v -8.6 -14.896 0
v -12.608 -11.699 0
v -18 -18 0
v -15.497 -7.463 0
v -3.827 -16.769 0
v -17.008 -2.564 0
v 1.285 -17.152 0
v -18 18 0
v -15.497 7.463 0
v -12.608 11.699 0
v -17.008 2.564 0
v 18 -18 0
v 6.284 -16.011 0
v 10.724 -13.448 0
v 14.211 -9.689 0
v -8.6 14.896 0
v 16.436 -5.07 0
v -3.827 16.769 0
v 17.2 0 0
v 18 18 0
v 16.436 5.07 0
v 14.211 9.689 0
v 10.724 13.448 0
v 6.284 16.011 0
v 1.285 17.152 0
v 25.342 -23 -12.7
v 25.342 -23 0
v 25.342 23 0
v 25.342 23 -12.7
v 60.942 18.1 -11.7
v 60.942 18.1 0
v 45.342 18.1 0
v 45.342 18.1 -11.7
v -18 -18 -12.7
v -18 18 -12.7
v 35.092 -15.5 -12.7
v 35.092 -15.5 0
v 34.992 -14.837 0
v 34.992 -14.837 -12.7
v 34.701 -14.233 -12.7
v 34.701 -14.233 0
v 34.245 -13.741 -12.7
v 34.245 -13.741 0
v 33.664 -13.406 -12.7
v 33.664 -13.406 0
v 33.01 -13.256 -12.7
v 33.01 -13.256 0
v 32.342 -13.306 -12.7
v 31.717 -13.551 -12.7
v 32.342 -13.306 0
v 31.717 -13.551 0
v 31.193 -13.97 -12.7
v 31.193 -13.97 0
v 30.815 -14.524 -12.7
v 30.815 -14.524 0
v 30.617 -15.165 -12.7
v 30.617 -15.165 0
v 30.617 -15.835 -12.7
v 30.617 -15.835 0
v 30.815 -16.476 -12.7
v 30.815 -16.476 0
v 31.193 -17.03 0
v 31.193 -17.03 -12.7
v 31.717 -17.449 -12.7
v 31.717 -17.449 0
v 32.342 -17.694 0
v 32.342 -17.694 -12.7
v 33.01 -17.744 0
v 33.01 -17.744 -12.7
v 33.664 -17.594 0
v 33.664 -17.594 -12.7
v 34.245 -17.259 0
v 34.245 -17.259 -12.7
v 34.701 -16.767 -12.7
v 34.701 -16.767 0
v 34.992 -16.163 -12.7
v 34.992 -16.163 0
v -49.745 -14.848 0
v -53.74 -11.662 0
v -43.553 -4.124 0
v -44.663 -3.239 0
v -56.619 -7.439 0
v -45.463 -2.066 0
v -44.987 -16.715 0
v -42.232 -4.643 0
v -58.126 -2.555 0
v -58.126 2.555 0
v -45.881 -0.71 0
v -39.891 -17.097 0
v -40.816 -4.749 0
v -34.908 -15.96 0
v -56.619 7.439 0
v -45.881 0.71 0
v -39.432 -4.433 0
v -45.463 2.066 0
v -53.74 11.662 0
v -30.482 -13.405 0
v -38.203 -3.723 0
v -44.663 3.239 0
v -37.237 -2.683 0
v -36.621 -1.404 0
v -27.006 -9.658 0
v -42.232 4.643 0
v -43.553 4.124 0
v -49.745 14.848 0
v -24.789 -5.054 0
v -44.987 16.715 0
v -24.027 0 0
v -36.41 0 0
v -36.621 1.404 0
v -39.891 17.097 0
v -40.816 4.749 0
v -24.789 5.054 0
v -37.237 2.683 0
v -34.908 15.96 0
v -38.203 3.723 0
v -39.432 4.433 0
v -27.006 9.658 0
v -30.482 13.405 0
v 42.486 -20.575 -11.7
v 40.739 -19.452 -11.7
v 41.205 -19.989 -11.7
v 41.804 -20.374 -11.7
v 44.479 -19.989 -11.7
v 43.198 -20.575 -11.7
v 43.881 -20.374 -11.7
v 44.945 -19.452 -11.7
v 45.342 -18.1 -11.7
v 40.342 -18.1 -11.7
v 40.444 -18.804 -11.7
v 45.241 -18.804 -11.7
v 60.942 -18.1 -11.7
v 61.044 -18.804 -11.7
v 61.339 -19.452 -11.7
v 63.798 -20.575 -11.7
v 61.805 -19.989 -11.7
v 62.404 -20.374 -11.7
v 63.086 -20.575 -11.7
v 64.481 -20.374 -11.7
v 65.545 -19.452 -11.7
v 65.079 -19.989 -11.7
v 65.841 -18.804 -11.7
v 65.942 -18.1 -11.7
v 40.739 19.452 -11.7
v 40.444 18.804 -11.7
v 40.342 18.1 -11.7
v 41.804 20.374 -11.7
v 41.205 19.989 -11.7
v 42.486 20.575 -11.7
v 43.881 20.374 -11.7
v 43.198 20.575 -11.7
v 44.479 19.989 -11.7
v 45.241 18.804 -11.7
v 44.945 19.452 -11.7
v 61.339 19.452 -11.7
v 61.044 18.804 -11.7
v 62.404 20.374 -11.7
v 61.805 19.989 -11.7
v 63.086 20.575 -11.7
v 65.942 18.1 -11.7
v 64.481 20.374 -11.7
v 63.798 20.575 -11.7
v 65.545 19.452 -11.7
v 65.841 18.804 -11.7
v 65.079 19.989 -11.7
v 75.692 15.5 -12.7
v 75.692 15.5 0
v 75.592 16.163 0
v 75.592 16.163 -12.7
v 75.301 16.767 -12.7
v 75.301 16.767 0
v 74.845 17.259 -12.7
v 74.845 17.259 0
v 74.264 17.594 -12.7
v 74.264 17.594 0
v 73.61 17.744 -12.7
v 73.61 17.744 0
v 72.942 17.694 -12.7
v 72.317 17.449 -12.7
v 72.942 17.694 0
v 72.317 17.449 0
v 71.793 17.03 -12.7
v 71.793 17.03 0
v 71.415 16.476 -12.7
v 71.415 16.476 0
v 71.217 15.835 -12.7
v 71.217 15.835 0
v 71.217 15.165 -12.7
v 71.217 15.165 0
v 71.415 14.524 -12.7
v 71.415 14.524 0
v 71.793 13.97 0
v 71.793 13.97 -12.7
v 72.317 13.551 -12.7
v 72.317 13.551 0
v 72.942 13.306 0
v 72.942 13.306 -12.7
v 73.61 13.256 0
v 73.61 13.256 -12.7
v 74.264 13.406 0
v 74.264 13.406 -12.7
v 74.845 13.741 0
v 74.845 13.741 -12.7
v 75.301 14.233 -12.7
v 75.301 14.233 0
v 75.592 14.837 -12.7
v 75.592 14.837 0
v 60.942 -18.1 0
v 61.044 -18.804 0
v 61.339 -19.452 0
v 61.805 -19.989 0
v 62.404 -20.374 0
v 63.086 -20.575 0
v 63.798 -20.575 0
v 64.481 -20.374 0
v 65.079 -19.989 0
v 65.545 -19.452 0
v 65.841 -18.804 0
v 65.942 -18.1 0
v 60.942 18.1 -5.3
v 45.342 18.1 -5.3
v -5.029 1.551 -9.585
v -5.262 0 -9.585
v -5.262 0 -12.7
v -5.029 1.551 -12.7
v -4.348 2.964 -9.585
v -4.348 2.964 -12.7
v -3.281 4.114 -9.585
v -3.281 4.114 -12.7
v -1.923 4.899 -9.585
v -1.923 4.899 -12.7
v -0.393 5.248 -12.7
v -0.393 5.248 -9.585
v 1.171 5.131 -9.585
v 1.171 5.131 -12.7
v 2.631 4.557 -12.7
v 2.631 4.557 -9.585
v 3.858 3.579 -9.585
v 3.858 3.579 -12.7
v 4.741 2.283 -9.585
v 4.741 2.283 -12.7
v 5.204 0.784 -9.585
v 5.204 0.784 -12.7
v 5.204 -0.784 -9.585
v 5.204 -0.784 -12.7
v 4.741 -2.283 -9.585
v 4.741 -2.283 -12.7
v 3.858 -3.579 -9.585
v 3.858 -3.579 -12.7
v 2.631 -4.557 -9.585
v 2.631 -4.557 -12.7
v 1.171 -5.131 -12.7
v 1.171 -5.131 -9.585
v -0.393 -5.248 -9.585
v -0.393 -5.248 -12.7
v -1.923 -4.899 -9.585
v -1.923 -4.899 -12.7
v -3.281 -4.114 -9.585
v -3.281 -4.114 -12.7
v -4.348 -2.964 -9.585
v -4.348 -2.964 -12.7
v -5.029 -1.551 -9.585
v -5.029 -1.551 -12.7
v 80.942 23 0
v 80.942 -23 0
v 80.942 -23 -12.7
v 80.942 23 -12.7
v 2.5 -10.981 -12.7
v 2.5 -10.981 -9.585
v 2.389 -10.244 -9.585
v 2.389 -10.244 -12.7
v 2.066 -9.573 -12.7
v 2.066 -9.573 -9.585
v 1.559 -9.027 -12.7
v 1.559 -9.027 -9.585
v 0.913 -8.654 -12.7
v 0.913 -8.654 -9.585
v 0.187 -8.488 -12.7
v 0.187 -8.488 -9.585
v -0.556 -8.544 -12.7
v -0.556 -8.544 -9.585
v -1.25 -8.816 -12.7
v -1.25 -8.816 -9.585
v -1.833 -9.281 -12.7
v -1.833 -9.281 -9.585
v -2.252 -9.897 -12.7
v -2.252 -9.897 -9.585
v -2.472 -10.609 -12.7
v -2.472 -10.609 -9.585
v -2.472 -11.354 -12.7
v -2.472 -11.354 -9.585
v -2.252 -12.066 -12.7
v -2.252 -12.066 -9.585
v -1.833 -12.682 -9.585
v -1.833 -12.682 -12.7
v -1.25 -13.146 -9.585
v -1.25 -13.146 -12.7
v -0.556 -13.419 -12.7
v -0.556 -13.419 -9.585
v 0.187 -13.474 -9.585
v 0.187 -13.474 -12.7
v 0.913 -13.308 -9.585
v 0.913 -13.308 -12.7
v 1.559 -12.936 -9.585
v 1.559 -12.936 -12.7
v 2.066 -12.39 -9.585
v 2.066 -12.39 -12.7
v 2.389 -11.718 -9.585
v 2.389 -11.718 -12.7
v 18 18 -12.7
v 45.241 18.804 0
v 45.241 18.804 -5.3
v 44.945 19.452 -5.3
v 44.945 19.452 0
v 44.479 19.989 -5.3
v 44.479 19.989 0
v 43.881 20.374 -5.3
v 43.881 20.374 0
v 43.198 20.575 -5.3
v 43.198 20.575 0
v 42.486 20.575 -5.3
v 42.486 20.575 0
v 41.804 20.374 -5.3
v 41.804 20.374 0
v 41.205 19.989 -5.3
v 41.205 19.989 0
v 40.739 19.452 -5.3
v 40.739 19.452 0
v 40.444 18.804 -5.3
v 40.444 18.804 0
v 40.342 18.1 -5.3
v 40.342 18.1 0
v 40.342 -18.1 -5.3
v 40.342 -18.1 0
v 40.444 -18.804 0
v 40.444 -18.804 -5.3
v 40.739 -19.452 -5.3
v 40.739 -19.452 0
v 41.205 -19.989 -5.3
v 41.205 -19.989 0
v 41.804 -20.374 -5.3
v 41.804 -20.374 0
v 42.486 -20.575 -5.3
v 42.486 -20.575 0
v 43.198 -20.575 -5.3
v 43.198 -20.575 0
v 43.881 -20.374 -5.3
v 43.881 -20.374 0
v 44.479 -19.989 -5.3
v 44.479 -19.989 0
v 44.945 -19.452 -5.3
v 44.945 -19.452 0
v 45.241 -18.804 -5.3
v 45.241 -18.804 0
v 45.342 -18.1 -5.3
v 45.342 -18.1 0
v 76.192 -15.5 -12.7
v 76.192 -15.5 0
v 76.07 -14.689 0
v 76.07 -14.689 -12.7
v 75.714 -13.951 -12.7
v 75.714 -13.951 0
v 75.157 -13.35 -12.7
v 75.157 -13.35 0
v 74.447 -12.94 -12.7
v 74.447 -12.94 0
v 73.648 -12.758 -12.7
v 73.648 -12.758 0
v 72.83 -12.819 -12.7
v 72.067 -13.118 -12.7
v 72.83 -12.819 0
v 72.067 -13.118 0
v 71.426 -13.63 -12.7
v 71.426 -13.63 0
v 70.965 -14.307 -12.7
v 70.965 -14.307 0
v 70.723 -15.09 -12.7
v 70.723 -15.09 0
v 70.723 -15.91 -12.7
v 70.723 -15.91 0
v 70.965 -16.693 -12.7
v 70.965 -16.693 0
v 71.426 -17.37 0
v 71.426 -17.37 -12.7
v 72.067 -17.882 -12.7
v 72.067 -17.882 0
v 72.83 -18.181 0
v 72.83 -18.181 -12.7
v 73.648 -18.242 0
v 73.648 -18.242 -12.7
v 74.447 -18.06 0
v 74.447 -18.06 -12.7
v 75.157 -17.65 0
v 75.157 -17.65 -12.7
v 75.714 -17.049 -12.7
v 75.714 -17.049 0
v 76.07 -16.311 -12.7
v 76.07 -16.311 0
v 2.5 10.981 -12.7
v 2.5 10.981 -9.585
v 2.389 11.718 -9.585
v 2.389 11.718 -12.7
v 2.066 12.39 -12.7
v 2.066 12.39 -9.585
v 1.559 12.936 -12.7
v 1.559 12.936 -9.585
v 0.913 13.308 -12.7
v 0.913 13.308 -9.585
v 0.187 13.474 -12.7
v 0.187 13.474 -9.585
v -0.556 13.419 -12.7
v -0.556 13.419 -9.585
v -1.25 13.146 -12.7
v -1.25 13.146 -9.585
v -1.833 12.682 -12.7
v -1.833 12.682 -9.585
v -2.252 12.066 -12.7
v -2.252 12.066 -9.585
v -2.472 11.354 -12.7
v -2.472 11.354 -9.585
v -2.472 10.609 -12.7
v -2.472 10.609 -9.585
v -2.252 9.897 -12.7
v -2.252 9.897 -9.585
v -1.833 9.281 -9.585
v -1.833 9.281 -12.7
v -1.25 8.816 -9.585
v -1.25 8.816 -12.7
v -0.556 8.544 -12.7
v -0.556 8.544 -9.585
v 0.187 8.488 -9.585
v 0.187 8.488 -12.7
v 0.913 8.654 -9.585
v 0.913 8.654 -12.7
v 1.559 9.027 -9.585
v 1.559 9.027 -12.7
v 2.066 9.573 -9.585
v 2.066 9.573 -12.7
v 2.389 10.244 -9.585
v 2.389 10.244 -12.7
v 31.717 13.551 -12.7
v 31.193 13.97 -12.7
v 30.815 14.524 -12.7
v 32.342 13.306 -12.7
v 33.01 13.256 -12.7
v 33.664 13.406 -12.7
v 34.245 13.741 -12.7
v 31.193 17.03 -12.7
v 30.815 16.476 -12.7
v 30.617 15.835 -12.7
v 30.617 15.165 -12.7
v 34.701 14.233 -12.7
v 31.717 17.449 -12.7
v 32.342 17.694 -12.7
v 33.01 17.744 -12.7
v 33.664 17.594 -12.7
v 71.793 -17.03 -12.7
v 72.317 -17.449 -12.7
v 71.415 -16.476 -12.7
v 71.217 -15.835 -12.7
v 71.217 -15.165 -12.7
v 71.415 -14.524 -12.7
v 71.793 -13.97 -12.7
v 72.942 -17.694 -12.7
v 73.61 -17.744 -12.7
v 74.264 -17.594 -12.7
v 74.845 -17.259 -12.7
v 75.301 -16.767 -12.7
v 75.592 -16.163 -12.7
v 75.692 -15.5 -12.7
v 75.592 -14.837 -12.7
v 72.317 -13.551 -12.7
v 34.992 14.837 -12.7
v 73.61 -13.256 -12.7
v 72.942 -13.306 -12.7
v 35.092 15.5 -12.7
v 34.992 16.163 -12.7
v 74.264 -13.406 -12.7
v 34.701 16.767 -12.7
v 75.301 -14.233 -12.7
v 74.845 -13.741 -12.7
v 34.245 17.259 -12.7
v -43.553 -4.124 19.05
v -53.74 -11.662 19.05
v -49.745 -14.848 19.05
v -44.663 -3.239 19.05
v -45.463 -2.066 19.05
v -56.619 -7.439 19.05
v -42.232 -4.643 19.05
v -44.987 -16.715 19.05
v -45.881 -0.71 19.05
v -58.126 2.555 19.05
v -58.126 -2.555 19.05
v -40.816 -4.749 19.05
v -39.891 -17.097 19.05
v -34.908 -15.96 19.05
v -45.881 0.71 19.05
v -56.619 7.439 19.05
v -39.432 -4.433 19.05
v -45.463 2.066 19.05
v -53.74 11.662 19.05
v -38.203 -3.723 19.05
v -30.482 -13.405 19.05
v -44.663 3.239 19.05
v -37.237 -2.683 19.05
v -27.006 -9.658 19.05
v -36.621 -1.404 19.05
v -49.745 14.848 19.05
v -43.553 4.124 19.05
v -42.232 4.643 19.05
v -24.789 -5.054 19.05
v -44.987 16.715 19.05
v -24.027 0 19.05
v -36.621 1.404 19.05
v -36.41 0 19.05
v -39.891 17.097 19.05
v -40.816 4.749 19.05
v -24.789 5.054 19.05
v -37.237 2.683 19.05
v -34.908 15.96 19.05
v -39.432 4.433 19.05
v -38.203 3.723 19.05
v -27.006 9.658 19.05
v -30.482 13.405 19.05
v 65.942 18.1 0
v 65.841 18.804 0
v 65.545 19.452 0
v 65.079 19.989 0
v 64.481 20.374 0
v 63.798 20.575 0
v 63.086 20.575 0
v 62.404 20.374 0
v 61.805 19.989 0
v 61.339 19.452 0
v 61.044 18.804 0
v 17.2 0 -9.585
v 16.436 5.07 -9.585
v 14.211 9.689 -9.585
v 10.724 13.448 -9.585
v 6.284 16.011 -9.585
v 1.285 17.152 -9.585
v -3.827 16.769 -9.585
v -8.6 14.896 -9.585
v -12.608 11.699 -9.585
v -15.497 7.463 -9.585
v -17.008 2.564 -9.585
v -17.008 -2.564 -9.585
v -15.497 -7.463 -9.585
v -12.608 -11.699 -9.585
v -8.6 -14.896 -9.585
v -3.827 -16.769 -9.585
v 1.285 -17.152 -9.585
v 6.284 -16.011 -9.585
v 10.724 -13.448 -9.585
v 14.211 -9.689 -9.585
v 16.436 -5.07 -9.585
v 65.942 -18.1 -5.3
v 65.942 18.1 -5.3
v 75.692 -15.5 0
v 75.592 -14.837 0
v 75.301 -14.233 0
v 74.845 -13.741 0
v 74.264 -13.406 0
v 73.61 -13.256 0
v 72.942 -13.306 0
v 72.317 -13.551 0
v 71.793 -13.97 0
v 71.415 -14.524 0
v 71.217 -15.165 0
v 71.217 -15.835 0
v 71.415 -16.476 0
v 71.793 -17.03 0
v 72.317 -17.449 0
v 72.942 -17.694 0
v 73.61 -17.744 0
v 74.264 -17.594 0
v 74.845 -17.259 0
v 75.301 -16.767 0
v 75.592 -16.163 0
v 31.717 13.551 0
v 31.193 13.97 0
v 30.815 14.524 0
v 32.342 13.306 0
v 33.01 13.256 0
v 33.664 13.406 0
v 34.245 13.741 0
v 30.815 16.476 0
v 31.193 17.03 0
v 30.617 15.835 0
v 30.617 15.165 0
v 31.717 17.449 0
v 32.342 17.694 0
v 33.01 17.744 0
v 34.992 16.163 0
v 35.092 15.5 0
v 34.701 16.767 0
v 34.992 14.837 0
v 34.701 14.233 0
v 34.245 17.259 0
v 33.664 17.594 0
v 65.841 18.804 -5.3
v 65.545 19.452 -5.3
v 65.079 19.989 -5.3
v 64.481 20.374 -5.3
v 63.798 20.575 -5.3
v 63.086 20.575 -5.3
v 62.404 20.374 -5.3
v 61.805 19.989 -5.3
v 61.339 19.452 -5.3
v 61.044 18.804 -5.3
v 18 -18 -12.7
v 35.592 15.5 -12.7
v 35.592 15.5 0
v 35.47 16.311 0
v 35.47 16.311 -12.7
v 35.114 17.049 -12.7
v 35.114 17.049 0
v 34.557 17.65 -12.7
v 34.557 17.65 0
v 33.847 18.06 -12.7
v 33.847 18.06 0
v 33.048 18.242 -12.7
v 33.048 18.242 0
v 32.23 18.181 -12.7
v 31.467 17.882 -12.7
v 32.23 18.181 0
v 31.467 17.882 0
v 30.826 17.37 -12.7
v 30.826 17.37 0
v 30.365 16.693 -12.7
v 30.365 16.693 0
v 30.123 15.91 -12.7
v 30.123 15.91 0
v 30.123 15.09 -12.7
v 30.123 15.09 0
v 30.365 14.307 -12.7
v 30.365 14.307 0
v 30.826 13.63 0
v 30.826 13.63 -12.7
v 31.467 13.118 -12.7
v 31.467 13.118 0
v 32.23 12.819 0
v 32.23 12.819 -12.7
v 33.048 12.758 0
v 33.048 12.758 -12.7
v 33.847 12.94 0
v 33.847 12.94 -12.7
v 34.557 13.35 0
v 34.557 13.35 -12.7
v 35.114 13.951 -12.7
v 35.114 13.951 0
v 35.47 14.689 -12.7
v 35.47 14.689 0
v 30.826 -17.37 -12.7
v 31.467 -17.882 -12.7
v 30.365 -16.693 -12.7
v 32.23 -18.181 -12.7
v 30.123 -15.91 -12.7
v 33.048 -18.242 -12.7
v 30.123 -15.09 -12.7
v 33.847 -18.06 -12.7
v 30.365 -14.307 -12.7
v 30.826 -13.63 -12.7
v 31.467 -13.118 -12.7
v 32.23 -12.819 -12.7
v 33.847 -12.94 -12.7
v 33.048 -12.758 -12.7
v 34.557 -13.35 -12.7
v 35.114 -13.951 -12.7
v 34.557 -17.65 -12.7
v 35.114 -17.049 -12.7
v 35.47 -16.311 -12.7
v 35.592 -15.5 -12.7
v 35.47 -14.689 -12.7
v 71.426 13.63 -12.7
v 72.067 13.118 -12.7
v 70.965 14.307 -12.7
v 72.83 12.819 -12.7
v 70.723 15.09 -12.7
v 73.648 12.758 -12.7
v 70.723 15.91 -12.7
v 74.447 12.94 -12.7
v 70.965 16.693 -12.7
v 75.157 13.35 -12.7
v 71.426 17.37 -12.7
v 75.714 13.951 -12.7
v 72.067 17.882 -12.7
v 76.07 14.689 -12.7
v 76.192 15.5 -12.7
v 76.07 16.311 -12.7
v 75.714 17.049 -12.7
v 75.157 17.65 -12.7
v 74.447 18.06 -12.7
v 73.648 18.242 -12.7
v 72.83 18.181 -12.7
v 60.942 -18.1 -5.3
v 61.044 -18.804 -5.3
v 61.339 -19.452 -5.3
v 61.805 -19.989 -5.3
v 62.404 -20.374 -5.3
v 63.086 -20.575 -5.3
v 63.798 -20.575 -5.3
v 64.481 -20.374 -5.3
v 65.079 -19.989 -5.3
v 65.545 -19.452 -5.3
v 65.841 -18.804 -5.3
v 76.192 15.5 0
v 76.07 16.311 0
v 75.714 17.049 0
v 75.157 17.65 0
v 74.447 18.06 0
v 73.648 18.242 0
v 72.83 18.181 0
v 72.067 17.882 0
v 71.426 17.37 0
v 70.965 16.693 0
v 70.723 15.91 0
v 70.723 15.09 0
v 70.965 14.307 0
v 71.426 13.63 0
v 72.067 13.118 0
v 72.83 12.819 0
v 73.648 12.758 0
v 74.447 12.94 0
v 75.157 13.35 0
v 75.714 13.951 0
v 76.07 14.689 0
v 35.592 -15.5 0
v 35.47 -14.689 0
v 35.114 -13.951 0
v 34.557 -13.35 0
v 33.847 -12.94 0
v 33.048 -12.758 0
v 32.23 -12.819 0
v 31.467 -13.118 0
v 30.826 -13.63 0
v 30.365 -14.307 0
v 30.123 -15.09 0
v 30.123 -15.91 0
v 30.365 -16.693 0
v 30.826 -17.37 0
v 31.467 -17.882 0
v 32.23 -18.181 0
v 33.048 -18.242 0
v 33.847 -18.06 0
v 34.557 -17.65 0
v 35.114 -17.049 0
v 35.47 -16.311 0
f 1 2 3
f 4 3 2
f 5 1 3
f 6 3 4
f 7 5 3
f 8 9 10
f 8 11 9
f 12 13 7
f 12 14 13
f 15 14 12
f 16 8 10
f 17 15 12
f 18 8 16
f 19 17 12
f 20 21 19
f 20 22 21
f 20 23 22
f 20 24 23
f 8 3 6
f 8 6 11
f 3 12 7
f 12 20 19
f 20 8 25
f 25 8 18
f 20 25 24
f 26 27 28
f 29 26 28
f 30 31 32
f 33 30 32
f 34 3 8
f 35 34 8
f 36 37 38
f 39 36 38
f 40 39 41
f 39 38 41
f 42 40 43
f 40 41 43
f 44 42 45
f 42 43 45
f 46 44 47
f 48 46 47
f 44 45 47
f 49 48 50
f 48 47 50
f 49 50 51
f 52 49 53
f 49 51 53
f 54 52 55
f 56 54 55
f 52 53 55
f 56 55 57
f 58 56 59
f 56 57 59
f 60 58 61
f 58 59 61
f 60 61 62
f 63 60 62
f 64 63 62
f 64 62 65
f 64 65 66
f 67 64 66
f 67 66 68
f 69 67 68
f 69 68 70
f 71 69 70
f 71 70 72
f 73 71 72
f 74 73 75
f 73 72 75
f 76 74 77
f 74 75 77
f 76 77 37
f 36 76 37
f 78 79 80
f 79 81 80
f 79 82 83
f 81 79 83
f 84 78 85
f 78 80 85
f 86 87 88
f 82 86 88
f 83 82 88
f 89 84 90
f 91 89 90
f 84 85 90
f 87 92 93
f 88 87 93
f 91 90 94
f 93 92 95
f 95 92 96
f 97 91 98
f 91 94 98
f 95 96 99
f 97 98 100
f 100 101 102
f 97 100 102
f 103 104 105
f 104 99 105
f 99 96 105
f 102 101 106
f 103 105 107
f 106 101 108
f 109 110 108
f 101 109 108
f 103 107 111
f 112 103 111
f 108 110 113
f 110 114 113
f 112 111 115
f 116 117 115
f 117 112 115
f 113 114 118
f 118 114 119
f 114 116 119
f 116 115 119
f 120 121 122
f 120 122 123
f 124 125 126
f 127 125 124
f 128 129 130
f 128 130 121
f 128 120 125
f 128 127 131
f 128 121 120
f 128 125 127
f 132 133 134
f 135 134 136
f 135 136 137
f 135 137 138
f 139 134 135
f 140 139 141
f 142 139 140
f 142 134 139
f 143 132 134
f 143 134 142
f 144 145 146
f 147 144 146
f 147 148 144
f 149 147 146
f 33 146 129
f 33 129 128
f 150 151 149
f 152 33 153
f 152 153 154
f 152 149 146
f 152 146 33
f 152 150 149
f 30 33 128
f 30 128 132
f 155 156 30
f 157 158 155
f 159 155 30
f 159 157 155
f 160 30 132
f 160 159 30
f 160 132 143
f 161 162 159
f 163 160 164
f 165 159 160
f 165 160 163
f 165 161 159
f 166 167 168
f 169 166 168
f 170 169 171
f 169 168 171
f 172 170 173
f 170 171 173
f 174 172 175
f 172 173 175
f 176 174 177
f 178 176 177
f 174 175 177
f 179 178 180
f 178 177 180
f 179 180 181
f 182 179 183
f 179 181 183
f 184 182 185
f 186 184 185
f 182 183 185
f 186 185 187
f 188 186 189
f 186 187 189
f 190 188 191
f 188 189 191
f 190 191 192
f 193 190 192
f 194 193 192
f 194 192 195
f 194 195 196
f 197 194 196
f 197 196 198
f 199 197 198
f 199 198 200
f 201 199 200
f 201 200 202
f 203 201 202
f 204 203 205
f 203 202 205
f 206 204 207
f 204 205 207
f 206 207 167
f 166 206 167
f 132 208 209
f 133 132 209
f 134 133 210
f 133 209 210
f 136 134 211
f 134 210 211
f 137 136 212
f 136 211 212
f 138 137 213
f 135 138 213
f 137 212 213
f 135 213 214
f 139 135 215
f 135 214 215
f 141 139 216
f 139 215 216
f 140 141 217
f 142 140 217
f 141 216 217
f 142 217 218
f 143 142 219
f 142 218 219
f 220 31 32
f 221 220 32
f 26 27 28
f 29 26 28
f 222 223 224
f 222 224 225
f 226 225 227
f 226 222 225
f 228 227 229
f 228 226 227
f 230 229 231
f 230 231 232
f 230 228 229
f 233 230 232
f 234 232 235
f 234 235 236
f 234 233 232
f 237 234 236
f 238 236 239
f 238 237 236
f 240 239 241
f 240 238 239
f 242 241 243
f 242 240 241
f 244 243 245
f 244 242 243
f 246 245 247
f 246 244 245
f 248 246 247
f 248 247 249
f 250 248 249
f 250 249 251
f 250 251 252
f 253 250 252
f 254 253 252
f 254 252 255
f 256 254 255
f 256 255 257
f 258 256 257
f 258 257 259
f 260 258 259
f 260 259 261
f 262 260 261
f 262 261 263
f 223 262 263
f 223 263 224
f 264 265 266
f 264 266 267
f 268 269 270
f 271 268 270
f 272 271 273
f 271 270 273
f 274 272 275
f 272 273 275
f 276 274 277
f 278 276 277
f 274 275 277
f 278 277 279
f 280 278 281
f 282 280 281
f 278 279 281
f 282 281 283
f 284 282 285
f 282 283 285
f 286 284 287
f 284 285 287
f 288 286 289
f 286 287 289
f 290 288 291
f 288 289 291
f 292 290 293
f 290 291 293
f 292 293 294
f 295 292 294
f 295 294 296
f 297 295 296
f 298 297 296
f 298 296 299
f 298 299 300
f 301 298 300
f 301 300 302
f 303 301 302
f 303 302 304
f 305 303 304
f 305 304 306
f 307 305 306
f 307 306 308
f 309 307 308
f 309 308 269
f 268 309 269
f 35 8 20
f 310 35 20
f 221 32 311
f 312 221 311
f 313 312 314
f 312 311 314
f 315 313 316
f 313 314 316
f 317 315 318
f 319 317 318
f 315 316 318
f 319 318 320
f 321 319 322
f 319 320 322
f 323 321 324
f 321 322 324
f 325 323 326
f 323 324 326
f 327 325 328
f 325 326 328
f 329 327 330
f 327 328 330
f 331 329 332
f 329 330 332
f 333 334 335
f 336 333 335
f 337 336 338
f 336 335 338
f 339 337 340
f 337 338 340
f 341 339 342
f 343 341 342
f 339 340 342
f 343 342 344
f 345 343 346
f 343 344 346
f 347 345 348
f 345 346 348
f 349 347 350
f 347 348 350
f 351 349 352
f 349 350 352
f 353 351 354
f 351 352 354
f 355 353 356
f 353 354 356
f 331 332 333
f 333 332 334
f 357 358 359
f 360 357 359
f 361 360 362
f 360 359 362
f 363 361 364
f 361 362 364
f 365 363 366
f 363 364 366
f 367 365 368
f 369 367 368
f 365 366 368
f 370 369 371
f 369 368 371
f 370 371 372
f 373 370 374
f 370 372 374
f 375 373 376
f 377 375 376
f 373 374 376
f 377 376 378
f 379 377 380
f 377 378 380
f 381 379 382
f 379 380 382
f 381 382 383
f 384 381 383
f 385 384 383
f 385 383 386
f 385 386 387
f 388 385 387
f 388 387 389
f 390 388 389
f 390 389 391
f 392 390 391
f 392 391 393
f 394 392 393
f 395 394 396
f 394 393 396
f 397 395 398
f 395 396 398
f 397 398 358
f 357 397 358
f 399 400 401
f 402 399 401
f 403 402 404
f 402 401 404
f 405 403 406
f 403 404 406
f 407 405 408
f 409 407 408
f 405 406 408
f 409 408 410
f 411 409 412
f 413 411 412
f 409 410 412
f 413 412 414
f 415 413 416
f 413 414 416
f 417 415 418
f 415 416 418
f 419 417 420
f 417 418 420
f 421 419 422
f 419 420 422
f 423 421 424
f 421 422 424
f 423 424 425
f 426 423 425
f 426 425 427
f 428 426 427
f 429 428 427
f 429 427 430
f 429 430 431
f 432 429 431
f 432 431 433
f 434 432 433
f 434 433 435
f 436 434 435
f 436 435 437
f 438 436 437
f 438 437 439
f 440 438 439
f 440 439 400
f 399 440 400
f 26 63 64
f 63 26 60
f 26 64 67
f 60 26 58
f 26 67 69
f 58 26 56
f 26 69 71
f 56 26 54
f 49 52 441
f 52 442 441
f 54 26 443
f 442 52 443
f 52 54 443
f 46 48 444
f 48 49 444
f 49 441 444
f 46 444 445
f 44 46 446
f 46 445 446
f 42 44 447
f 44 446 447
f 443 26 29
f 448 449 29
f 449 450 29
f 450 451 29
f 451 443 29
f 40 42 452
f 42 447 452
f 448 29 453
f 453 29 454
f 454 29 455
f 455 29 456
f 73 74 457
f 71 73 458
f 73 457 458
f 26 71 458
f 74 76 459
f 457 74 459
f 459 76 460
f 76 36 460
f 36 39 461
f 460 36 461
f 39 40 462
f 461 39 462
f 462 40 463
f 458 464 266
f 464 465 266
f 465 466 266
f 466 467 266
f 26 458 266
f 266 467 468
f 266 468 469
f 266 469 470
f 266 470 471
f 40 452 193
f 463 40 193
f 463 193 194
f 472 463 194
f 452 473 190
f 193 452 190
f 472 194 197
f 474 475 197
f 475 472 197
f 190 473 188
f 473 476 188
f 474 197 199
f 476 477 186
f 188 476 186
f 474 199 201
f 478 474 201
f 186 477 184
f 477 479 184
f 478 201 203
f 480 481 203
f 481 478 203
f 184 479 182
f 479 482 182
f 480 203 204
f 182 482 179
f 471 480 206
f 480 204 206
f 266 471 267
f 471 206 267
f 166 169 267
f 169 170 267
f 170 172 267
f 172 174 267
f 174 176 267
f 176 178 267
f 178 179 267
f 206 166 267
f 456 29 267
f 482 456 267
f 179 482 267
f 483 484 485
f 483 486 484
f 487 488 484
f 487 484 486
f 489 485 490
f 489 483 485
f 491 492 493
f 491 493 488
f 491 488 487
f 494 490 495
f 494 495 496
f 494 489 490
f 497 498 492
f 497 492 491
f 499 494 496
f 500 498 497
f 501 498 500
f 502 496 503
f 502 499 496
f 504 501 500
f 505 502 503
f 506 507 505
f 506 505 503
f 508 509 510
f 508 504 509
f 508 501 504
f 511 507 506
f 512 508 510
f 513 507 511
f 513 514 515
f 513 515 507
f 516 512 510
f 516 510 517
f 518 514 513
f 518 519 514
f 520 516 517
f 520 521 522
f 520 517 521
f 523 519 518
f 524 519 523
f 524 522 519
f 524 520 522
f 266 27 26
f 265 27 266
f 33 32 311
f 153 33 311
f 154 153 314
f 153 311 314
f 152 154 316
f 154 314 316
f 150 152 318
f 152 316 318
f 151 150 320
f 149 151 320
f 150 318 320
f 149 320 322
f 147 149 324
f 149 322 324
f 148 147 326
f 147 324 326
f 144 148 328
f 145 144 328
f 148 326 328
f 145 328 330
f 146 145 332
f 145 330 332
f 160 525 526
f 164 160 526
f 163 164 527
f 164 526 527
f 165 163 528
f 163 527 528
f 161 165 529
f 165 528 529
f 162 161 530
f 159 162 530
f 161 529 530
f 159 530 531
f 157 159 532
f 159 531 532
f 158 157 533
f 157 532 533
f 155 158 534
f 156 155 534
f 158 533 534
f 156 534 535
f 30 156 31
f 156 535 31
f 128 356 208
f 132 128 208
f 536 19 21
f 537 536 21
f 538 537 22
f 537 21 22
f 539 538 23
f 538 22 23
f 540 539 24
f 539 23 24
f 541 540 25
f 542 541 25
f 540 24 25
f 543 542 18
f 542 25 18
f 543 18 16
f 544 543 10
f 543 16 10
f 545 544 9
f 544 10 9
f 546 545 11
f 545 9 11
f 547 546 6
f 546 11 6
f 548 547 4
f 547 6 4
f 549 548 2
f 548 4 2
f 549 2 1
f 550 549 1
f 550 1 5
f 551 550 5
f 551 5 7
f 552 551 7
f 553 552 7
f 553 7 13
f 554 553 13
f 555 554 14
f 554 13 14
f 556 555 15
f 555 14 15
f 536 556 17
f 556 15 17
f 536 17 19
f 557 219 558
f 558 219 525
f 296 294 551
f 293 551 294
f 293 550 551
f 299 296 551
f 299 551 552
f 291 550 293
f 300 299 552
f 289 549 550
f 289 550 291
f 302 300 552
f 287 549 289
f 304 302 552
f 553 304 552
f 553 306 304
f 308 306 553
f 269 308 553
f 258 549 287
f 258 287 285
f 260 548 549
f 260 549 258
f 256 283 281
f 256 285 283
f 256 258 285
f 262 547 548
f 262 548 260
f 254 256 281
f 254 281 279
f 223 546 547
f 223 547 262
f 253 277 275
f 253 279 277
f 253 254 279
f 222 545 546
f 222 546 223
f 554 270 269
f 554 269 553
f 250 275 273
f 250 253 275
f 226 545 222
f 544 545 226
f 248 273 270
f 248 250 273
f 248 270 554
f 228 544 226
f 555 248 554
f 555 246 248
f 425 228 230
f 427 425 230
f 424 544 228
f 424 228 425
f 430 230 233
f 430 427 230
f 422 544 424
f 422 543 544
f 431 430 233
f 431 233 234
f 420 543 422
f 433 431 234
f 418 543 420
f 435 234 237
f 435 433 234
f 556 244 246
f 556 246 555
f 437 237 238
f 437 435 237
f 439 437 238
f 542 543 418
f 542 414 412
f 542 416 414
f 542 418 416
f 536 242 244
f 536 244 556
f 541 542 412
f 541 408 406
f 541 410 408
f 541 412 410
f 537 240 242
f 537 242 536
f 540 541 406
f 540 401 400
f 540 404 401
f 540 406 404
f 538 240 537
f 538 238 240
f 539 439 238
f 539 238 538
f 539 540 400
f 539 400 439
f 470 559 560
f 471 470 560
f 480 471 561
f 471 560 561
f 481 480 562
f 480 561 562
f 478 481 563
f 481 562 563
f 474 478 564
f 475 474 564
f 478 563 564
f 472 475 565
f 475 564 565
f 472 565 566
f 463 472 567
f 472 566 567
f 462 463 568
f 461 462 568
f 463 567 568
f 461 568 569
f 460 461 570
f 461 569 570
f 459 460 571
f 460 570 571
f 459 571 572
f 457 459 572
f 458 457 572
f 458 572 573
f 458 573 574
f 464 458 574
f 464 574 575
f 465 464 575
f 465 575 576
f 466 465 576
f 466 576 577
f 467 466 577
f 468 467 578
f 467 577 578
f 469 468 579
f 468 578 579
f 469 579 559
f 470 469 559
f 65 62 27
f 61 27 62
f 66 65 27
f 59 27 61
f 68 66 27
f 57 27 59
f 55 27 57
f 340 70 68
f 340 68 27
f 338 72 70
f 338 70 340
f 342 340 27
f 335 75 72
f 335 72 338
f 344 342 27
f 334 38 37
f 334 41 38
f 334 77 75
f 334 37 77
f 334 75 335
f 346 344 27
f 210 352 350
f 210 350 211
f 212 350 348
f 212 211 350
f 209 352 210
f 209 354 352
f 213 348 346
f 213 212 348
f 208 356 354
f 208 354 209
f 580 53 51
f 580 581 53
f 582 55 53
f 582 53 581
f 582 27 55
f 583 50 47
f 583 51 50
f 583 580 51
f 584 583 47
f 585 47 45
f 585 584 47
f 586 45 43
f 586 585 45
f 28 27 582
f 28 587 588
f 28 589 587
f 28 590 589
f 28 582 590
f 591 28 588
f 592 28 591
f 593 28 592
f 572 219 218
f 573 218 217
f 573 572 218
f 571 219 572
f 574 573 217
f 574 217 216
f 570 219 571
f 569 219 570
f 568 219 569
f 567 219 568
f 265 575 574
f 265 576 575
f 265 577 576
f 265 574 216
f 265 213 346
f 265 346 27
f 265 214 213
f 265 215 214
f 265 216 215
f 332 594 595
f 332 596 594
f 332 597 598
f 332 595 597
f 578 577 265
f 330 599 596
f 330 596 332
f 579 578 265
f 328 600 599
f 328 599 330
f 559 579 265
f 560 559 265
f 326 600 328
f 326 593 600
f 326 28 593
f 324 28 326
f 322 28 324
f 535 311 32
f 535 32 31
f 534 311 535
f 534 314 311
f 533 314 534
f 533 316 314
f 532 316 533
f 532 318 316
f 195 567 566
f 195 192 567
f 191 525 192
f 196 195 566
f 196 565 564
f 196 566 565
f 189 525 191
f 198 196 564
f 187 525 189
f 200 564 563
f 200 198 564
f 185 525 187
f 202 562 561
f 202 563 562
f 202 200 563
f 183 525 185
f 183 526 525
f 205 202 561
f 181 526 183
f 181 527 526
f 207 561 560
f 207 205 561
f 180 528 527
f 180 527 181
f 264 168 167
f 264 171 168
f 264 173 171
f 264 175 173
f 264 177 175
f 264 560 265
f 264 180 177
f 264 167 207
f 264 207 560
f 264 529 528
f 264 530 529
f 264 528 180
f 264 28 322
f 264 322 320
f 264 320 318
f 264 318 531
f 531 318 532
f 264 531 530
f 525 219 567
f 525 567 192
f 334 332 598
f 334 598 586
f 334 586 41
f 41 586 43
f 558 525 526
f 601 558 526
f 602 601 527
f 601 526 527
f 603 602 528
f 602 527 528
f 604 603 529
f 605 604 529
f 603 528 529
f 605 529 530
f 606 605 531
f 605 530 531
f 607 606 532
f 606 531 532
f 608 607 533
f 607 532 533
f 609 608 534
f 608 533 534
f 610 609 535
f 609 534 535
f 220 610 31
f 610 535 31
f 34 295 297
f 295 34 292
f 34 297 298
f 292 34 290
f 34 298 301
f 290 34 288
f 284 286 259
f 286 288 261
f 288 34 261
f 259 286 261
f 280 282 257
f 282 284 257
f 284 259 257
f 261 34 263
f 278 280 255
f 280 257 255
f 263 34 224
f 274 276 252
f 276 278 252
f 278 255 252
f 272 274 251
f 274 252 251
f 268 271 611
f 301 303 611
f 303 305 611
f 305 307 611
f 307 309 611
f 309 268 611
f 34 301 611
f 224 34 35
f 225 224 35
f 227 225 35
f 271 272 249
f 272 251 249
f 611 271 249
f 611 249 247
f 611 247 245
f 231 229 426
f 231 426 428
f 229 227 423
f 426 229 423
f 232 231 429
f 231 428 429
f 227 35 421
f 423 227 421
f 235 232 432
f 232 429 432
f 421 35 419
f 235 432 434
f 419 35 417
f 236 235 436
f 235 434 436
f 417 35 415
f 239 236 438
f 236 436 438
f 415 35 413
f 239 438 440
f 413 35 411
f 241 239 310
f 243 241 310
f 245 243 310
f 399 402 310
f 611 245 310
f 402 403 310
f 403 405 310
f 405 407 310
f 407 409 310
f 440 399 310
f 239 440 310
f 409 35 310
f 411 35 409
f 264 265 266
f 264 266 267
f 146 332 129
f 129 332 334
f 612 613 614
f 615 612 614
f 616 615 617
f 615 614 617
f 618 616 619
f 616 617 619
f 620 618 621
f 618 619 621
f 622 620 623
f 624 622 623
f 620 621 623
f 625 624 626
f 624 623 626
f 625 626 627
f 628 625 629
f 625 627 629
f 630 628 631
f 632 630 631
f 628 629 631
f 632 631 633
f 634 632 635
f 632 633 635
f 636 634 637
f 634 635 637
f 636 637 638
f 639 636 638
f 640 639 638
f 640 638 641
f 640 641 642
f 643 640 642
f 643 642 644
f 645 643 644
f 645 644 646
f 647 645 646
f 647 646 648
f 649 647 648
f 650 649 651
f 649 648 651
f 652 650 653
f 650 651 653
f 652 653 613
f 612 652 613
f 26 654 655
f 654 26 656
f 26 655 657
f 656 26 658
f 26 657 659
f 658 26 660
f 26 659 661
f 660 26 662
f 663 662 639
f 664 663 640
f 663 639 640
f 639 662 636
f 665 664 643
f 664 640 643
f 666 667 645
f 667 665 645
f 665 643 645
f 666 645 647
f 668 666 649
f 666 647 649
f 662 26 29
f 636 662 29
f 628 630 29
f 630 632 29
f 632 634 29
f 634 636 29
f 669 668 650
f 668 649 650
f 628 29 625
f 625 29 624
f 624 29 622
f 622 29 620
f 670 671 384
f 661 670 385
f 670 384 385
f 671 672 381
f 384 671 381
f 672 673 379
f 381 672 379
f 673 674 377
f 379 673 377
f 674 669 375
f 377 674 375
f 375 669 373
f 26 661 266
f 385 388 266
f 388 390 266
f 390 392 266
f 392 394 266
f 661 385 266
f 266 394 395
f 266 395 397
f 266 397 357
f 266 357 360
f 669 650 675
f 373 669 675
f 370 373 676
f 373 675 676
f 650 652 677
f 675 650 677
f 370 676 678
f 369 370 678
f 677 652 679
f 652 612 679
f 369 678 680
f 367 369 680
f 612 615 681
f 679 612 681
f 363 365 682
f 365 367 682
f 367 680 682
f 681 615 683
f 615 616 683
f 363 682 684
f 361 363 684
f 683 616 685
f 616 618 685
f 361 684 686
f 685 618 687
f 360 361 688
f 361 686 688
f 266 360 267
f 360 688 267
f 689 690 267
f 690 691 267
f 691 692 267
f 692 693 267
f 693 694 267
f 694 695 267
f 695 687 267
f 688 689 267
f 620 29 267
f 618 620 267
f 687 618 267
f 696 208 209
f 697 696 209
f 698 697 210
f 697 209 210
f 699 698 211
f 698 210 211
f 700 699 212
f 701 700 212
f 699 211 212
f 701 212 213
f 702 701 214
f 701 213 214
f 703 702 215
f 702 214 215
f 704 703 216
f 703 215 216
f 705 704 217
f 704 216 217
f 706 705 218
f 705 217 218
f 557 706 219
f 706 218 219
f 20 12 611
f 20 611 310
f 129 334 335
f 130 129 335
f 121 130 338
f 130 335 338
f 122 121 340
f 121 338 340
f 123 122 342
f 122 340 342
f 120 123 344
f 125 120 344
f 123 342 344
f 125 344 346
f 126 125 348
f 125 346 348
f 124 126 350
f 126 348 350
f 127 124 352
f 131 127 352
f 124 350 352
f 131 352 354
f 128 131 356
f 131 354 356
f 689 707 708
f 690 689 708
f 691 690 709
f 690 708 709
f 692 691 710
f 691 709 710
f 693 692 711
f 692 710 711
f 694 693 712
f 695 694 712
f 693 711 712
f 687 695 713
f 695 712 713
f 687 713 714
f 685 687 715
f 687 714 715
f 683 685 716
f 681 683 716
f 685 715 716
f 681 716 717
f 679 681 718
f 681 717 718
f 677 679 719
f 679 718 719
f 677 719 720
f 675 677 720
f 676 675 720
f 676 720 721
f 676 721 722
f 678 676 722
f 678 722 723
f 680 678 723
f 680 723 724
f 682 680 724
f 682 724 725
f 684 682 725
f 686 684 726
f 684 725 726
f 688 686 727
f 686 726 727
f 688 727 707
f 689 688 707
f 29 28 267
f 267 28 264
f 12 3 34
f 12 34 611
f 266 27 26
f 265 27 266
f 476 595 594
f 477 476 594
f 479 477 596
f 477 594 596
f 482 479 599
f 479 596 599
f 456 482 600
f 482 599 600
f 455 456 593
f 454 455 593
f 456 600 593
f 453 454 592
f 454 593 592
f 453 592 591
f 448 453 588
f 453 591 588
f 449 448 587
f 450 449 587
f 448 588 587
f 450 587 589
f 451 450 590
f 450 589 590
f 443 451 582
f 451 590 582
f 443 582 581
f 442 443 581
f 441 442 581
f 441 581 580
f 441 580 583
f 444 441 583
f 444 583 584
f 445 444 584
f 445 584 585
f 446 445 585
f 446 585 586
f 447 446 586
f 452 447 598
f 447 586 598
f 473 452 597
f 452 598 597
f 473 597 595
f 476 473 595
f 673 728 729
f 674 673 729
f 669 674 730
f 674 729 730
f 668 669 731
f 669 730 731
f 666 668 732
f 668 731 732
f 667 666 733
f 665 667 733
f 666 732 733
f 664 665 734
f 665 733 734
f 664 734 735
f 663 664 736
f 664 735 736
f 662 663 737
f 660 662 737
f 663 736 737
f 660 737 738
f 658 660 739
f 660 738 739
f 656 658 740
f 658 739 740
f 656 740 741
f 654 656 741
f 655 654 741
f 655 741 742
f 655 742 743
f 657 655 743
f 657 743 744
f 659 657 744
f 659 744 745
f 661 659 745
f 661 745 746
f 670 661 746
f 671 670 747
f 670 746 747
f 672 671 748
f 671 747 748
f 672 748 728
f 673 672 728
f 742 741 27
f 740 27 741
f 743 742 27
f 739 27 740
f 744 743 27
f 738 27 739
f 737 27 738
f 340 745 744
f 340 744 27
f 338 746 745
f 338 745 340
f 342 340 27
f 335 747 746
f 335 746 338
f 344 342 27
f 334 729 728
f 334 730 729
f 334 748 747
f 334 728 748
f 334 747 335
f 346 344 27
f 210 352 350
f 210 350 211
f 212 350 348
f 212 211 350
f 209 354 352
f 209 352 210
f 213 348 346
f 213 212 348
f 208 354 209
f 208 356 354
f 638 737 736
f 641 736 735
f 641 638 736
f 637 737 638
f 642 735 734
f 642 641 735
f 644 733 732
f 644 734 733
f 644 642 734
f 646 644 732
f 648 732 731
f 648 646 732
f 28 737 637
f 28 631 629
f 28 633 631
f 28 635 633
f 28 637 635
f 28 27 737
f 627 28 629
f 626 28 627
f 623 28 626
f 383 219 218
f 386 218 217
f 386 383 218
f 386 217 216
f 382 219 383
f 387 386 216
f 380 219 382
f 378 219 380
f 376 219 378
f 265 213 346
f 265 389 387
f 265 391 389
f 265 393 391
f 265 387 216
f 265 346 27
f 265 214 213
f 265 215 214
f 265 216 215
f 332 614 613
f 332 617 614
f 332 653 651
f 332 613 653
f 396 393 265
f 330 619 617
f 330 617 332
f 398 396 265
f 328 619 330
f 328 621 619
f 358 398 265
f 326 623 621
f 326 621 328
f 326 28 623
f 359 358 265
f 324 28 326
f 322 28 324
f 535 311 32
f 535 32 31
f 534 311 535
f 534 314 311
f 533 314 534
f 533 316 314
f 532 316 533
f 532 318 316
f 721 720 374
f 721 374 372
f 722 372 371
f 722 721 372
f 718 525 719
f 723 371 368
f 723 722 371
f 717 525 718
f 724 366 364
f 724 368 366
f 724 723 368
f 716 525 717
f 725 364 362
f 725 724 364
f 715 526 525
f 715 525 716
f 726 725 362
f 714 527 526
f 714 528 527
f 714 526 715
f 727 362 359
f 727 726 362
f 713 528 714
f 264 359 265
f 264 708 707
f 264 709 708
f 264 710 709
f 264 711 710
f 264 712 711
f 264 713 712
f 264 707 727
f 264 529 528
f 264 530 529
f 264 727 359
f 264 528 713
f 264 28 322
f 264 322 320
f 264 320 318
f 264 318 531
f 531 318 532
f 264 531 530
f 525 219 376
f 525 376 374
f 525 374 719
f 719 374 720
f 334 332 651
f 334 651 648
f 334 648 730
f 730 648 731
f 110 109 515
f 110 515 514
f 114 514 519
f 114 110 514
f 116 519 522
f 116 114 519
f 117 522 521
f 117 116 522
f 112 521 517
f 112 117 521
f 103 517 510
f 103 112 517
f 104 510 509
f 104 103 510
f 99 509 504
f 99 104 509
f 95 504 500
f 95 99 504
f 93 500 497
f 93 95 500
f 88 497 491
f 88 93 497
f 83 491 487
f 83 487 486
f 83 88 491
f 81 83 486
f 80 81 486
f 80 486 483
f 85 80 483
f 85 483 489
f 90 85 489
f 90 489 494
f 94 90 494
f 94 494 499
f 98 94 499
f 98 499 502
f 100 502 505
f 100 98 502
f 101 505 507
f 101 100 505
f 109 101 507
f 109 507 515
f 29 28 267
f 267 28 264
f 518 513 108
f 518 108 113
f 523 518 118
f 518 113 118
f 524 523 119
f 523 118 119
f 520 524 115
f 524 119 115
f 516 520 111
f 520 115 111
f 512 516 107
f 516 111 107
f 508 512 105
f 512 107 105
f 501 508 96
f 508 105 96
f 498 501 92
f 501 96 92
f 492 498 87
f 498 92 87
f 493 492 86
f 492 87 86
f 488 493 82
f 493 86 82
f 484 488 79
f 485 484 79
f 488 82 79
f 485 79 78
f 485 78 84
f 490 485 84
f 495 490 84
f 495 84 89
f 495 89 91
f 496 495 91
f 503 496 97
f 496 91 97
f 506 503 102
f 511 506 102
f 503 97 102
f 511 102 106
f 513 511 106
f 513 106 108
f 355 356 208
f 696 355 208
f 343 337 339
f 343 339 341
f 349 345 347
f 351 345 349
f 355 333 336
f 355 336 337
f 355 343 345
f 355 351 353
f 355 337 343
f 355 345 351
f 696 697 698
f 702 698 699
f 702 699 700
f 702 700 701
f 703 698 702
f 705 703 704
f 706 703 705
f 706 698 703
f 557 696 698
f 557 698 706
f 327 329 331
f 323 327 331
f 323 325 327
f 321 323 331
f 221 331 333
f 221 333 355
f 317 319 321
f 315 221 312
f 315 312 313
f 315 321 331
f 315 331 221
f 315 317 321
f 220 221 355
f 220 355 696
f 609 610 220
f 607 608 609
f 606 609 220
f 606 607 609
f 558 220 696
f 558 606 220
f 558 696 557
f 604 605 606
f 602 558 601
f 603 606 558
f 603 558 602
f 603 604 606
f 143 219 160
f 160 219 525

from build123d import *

# Parameters (mm, degrees)
F0_W     = 36
F0_H     = 36
F0_R     = 2.5
F1_DEPTH = 12.7
F2_DEPTH = 9.585
F3_W     = 55.6
F3_H     = 46
F3_R     = 2.75
F3_R_2   = 2.25
F4_DEPTH = 12.7
F5_DEPTH = 11.7
F6_R     = 17.145
F6_R_2   = 4.7625
F7_DEPTH = 19.05
F8_DEPTH = 12.7
F9_DEPTH = 5.3


# Not quite as in the source:
# - a length typed as a fraction of an inch, garbled in the dataset ("3 / 203.2 mm" for 3/8 in), is restored


with BuildPart() as f1:
    # F0 (on Top) → F1 (new body)
    with BuildSketch(Plane.XY):
        Rectangle(F0_W, F0_H)
        with BuildLine():
            ThreePointArc((-17.2, 0), (0, 17.2), (17.2, 0))
            ThreePointArc((17.2, 0), (0, -17.2), (-17.2, 0))
        make_face(mode=Mode.SUBTRACT)
        with BuildLine():
            ThreePointArc((-17.2, 0), (0, -17.2), (17.2, 0))
            ThreePointArc((17.2, 0), (0, 17.2), (-17.2, 0))
        make_face()
        with Locations((0, -10.98125)):
            Circle(F0_R, mode=Mode.SUBTRACT)
        with BuildLine():
            ThreePointArc((5.2625, 0), (0, -5.2625), (-5.2625, 0))
            ThreePointArc((-5.2625, 0), (0, 5.2625), (5.2625, 0))
        make_face(mode=Mode.SUBTRACT)
        with Locations((0, 10.98125)):
            Circle(F0_R, mode=Mode.SUBTRACT)
    extrude(amount=-F1_DEPTH)

    # F0 (on Top) → F2 (cut)
    with BuildSketch(Plane.XY):
        with BuildLine():
            ThreePointArc((-17.2, 0), (0, -17.2), (17.2, 0))
            ThreePointArc((17.2, 0), (0, 17.2), (-17.2, 0))
        make_face()
        with Locations((0, -10.98125)):
            Circle(F0_R, mode=Mode.SUBTRACT)
        with BuildLine():
            ThreePointArc((5.2625, 0), (0, -5.2625), (-5.2625, 0))
            ThreePointArc((-5.2625, 0), (0, 5.2625), (5.2625, 0))
        make_face(mode=Mode.SUBTRACT)
        with Locations((0, 10.98125)):
            Circle(F0_R, mode=Mode.SUBTRACT)
    extrude(amount=-F2_DEPTH, mode=Mode.SUBTRACT)


with BuildPart() as f4:
    # F3 (on Top) → F4 (new body)
    with BuildSketch(Plane.XY):
        with Locations((53.1422479868, 0)):
            Rectangle(F3_W, F3_H)
        with Locations((32.8422479868, -15.5)):
            Circle(F3_R, mode=Mode.SUBTRACT)
        with Locations((73.4422479868, -15.5)):
            Circle(F3_R, mode=Mode.SUBTRACT)
        with BuildLine():
            Line((40.3422479868, -18.1), (40.3422479868, 18.1))
            ThreePointArc((40.3422479868, 18.1), (42.8422479868, 20.6), (45.3422479868, 18.1))
            Line((45.3422479868, 18.1), (60.9422479868, 18.1))
            ThreePointArc((60.9422479868, 18.1), (63.4422479868, 20.6), (65.9422479868, 18.1))
            Line((65.9422479868, 18.1), (65.9422479868, -18.1))
            ThreePointArc((65.9422479868, -18.1), (63.4422479868, -20.6), (60.9422479868, -18.1))
            Line((60.9422479868, -18.1), (45.3422479868, -18.1))
            ThreePointArc((45.3422479868, -18.1), (42.8422479868, -20.6), (40.3422479868, -18.1))
        make_face(mode=Mode.SUBTRACT)
        with Locations((32.8422479868, 15.5)):
            Circle(F3_R, mode=Mode.SUBTRACT)
        with Locations((73.4422479868, 15.5)):
            Circle(F3_R, mode=Mode.SUBTRACT)
        with BuildLine():
            ThreePointArc((45.3422479868, 18.1), (42.8422479868, 20.6), (40.3422479868, 18.1))
            Line((40.3422479868, 18.1), (40.3422479868, -18.1))
            ThreePointArc((40.3422479868, -18.1), (42.8422479868, -20.6), (45.3422479868, -18.1))
            Line((45.3422479868, -18.1), (60.9422479868, -18.1))
            ThreePointArc((60.9422479868, -18.1), (63.4422479868, -20.6), (65.9422479868, -18.1))
            Line((65.9422479868, -18.1), (65.9422479868, 18.1))
            ThreePointArc((65.9422479868, 18.1), (63.4422479868, 20.6), (60.9422479868, 18.1))
            Line((60.9422479868, 18.1), (45.3422479868, 18.1))
        make_face()
        with Locations((32.8422479868, 15.5)):
            Circle(F3_R)
        with Locations((32.8422479868, 15.5)):
            Circle(F3_R_2, mode=Mode.SUBTRACT)
        with Locations((32.8422479868, -15.5)):
            Circle(F3_R)
        with Locations((32.8422479868, -15.5)):
            Circle(F3_R_2, mode=Mode.SUBTRACT)
        with Locations((73.4422479868, -15.5)):
            Circle(F3_R)
        with Locations((73.4422479868, -15.5)):
            Circle(F3_R_2, mode=Mode.SUBTRACT)
        with Locations((73.4422479868, 15.5)):
            Circle(F3_R)
        with Locations((73.4422479868, 15.5)):
            Circle(F3_R_2, mode=Mode.SUBTRACT)
    extrude(amount=-F4_DEPTH)

    # F3 (on Top) → F5 (cut)
    with BuildSketch(Plane.XY):
        with BuildLine():
            ThreePointArc((45.3422479868, 18.1), (42.8422479868, 20.6), (40.3422479868, 18.1))
            Line((40.3422479868, 18.1), (40.3422479868, -18.1))
            ThreePointArc((40.3422479868, -18.1), (42.8422479868, -20.6), (45.3422479868, -18.1))
            Line((45.3422479868, -18.1), (60.9422479868, -18.1))
            ThreePointArc((60.9422479868, -18.1), (63.4422479868, -20.6), (65.9422479868, -18.1))
            Line((65.9422479868, -18.1), (65.9422479868, 18.1))
            ThreePointArc((65.9422479868, 18.1), (63.4422479868, 20.6), (60.9422479868, 18.1))
            Line((60.9422479868, 18.1), (45.3422479868, 18.1))
        make_face()
    extrude(amount=-F5_DEPTH, mode=Mode.SUBTRACT)


with BuildPart() as f7:
    # F6 (on Top) → F7 (new body)
    with BuildSketch(Plane.XY):
        with Locations((-41.1721505225, 0)):
            Circle(F6_R)
        with Locations((-41.1721505225, 0)):
            Circle(F6_R_2, mode=Mode.SUBTRACT)
    extrude(amount=F7_DEPTH)


with BuildPart() as f8:
    # F3 (on Top) → F8 (new body)
    with BuildSketch(Plane.XY):
        with Locations((53.1422479868, 0)):
            Rectangle(F3_W, F3_H)
        with Locations((32.8422479868, -15.5)):
            Circle(F3_R, mode=Mode.SUBTRACT)
        with Locations((73.4422479868, -15.5)):
            Circle(F3_R, mode=Mode.SUBTRACT)
        with BuildLine():
            Line((40.3422479868, -18.1), (40.3422479868, 18.1))
            ThreePointArc((40.3422479868, 18.1), (42.8422479868, 20.6), (45.3422479868, 18.1))
            Line((45.3422479868, 18.1), (60.9422479868, 18.1))
            ThreePointArc((60.9422479868, 18.1), (63.4422479868, 20.6), (65.9422479868, 18.1))
            Line((65.9422479868, 18.1), (65.9422479868, -18.1))
            ThreePointArc((65.9422479868, -18.1), (63.4422479868, -20.6), (60.9422479868, -18.1))
            Line((60.9422479868, -18.1), (45.3422479868, -18.1))
            ThreePointArc((45.3422479868, -18.1), (42.8422479868, -20.6), (40.3422479868, -18.1))
        make_face(mode=Mode.SUBTRACT)
        with Locations((32.8422479868, 15.5)):
            Circle(F3_R, mode=Mode.SUBTRACT)
        with Locations((73.4422479868, 15.5)):
            Circle(F3_R, mode=Mode.SUBTRACT)
        with BuildLine():
            ThreePointArc((45.3422479868, 18.1), (42.8422479868, 20.6), (40.3422479868, 18.1))
            Line((40.3422479868, 18.1), (40.3422479868, -18.1))
            ThreePointArc((40.3422479868, -18.1), (42.8422479868, -20.6), (45.3422479868, -18.1))
            Line((45.3422479868, -18.1), (60.9422479868, -18.1))
            ThreePointArc((60.9422479868, -18.1), (63.4422479868, -20.6), (65.9422479868, -18.1))
            Line((65.9422479868, -18.1), (65.9422479868, 18.1))
            ThreePointArc((65.9422479868, 18.1), (63.4422479868, 20.6), (60.9422479868, 18.1))
            Line((60.9422479868, 18.1), (45.3422479868, 18.1))
        make_face()
    extrude(amount=-F8_DEPTH)

    # F3 (on Top) → F9 (cut)
    with BuildSketch(Plane.XY):
        with BuildLine():
            ThreePointArc((45.3422479868, 18.1), (42.8422479868, 20.6), (40.3422479868, 18.1))
            Line((40.3422479868, 18.1), (40.3422479868, -18.1))
            ThreePointArc((40.3422479868, -18.1), (42.8422479868, -20.6), (45.3422479868, -18.1))
            Line((45.3422479868, -18.1), (60.9422479868, -18.1))
            ThreePointArc((60.9422479868, -18.1), (63.4422479868, -20.6), (65.9422479868, -18.1))
            Line((65.9422479868, -18.1), (65.9422479868, 18.1))
            ThreePointArc((65.9422479868, 18.1), (63.4422479868, 20.6), (60.9422479868, 18.1))
            Line((60.9422479868, 18.1), (45.3422479868, 18.1))
        make_face()
    extrude(amount=-F9_DEPTH, mode=Mode.SUBTRACT)


solid = Compound([f1.part, f4.part, f7.part, f8.part])
